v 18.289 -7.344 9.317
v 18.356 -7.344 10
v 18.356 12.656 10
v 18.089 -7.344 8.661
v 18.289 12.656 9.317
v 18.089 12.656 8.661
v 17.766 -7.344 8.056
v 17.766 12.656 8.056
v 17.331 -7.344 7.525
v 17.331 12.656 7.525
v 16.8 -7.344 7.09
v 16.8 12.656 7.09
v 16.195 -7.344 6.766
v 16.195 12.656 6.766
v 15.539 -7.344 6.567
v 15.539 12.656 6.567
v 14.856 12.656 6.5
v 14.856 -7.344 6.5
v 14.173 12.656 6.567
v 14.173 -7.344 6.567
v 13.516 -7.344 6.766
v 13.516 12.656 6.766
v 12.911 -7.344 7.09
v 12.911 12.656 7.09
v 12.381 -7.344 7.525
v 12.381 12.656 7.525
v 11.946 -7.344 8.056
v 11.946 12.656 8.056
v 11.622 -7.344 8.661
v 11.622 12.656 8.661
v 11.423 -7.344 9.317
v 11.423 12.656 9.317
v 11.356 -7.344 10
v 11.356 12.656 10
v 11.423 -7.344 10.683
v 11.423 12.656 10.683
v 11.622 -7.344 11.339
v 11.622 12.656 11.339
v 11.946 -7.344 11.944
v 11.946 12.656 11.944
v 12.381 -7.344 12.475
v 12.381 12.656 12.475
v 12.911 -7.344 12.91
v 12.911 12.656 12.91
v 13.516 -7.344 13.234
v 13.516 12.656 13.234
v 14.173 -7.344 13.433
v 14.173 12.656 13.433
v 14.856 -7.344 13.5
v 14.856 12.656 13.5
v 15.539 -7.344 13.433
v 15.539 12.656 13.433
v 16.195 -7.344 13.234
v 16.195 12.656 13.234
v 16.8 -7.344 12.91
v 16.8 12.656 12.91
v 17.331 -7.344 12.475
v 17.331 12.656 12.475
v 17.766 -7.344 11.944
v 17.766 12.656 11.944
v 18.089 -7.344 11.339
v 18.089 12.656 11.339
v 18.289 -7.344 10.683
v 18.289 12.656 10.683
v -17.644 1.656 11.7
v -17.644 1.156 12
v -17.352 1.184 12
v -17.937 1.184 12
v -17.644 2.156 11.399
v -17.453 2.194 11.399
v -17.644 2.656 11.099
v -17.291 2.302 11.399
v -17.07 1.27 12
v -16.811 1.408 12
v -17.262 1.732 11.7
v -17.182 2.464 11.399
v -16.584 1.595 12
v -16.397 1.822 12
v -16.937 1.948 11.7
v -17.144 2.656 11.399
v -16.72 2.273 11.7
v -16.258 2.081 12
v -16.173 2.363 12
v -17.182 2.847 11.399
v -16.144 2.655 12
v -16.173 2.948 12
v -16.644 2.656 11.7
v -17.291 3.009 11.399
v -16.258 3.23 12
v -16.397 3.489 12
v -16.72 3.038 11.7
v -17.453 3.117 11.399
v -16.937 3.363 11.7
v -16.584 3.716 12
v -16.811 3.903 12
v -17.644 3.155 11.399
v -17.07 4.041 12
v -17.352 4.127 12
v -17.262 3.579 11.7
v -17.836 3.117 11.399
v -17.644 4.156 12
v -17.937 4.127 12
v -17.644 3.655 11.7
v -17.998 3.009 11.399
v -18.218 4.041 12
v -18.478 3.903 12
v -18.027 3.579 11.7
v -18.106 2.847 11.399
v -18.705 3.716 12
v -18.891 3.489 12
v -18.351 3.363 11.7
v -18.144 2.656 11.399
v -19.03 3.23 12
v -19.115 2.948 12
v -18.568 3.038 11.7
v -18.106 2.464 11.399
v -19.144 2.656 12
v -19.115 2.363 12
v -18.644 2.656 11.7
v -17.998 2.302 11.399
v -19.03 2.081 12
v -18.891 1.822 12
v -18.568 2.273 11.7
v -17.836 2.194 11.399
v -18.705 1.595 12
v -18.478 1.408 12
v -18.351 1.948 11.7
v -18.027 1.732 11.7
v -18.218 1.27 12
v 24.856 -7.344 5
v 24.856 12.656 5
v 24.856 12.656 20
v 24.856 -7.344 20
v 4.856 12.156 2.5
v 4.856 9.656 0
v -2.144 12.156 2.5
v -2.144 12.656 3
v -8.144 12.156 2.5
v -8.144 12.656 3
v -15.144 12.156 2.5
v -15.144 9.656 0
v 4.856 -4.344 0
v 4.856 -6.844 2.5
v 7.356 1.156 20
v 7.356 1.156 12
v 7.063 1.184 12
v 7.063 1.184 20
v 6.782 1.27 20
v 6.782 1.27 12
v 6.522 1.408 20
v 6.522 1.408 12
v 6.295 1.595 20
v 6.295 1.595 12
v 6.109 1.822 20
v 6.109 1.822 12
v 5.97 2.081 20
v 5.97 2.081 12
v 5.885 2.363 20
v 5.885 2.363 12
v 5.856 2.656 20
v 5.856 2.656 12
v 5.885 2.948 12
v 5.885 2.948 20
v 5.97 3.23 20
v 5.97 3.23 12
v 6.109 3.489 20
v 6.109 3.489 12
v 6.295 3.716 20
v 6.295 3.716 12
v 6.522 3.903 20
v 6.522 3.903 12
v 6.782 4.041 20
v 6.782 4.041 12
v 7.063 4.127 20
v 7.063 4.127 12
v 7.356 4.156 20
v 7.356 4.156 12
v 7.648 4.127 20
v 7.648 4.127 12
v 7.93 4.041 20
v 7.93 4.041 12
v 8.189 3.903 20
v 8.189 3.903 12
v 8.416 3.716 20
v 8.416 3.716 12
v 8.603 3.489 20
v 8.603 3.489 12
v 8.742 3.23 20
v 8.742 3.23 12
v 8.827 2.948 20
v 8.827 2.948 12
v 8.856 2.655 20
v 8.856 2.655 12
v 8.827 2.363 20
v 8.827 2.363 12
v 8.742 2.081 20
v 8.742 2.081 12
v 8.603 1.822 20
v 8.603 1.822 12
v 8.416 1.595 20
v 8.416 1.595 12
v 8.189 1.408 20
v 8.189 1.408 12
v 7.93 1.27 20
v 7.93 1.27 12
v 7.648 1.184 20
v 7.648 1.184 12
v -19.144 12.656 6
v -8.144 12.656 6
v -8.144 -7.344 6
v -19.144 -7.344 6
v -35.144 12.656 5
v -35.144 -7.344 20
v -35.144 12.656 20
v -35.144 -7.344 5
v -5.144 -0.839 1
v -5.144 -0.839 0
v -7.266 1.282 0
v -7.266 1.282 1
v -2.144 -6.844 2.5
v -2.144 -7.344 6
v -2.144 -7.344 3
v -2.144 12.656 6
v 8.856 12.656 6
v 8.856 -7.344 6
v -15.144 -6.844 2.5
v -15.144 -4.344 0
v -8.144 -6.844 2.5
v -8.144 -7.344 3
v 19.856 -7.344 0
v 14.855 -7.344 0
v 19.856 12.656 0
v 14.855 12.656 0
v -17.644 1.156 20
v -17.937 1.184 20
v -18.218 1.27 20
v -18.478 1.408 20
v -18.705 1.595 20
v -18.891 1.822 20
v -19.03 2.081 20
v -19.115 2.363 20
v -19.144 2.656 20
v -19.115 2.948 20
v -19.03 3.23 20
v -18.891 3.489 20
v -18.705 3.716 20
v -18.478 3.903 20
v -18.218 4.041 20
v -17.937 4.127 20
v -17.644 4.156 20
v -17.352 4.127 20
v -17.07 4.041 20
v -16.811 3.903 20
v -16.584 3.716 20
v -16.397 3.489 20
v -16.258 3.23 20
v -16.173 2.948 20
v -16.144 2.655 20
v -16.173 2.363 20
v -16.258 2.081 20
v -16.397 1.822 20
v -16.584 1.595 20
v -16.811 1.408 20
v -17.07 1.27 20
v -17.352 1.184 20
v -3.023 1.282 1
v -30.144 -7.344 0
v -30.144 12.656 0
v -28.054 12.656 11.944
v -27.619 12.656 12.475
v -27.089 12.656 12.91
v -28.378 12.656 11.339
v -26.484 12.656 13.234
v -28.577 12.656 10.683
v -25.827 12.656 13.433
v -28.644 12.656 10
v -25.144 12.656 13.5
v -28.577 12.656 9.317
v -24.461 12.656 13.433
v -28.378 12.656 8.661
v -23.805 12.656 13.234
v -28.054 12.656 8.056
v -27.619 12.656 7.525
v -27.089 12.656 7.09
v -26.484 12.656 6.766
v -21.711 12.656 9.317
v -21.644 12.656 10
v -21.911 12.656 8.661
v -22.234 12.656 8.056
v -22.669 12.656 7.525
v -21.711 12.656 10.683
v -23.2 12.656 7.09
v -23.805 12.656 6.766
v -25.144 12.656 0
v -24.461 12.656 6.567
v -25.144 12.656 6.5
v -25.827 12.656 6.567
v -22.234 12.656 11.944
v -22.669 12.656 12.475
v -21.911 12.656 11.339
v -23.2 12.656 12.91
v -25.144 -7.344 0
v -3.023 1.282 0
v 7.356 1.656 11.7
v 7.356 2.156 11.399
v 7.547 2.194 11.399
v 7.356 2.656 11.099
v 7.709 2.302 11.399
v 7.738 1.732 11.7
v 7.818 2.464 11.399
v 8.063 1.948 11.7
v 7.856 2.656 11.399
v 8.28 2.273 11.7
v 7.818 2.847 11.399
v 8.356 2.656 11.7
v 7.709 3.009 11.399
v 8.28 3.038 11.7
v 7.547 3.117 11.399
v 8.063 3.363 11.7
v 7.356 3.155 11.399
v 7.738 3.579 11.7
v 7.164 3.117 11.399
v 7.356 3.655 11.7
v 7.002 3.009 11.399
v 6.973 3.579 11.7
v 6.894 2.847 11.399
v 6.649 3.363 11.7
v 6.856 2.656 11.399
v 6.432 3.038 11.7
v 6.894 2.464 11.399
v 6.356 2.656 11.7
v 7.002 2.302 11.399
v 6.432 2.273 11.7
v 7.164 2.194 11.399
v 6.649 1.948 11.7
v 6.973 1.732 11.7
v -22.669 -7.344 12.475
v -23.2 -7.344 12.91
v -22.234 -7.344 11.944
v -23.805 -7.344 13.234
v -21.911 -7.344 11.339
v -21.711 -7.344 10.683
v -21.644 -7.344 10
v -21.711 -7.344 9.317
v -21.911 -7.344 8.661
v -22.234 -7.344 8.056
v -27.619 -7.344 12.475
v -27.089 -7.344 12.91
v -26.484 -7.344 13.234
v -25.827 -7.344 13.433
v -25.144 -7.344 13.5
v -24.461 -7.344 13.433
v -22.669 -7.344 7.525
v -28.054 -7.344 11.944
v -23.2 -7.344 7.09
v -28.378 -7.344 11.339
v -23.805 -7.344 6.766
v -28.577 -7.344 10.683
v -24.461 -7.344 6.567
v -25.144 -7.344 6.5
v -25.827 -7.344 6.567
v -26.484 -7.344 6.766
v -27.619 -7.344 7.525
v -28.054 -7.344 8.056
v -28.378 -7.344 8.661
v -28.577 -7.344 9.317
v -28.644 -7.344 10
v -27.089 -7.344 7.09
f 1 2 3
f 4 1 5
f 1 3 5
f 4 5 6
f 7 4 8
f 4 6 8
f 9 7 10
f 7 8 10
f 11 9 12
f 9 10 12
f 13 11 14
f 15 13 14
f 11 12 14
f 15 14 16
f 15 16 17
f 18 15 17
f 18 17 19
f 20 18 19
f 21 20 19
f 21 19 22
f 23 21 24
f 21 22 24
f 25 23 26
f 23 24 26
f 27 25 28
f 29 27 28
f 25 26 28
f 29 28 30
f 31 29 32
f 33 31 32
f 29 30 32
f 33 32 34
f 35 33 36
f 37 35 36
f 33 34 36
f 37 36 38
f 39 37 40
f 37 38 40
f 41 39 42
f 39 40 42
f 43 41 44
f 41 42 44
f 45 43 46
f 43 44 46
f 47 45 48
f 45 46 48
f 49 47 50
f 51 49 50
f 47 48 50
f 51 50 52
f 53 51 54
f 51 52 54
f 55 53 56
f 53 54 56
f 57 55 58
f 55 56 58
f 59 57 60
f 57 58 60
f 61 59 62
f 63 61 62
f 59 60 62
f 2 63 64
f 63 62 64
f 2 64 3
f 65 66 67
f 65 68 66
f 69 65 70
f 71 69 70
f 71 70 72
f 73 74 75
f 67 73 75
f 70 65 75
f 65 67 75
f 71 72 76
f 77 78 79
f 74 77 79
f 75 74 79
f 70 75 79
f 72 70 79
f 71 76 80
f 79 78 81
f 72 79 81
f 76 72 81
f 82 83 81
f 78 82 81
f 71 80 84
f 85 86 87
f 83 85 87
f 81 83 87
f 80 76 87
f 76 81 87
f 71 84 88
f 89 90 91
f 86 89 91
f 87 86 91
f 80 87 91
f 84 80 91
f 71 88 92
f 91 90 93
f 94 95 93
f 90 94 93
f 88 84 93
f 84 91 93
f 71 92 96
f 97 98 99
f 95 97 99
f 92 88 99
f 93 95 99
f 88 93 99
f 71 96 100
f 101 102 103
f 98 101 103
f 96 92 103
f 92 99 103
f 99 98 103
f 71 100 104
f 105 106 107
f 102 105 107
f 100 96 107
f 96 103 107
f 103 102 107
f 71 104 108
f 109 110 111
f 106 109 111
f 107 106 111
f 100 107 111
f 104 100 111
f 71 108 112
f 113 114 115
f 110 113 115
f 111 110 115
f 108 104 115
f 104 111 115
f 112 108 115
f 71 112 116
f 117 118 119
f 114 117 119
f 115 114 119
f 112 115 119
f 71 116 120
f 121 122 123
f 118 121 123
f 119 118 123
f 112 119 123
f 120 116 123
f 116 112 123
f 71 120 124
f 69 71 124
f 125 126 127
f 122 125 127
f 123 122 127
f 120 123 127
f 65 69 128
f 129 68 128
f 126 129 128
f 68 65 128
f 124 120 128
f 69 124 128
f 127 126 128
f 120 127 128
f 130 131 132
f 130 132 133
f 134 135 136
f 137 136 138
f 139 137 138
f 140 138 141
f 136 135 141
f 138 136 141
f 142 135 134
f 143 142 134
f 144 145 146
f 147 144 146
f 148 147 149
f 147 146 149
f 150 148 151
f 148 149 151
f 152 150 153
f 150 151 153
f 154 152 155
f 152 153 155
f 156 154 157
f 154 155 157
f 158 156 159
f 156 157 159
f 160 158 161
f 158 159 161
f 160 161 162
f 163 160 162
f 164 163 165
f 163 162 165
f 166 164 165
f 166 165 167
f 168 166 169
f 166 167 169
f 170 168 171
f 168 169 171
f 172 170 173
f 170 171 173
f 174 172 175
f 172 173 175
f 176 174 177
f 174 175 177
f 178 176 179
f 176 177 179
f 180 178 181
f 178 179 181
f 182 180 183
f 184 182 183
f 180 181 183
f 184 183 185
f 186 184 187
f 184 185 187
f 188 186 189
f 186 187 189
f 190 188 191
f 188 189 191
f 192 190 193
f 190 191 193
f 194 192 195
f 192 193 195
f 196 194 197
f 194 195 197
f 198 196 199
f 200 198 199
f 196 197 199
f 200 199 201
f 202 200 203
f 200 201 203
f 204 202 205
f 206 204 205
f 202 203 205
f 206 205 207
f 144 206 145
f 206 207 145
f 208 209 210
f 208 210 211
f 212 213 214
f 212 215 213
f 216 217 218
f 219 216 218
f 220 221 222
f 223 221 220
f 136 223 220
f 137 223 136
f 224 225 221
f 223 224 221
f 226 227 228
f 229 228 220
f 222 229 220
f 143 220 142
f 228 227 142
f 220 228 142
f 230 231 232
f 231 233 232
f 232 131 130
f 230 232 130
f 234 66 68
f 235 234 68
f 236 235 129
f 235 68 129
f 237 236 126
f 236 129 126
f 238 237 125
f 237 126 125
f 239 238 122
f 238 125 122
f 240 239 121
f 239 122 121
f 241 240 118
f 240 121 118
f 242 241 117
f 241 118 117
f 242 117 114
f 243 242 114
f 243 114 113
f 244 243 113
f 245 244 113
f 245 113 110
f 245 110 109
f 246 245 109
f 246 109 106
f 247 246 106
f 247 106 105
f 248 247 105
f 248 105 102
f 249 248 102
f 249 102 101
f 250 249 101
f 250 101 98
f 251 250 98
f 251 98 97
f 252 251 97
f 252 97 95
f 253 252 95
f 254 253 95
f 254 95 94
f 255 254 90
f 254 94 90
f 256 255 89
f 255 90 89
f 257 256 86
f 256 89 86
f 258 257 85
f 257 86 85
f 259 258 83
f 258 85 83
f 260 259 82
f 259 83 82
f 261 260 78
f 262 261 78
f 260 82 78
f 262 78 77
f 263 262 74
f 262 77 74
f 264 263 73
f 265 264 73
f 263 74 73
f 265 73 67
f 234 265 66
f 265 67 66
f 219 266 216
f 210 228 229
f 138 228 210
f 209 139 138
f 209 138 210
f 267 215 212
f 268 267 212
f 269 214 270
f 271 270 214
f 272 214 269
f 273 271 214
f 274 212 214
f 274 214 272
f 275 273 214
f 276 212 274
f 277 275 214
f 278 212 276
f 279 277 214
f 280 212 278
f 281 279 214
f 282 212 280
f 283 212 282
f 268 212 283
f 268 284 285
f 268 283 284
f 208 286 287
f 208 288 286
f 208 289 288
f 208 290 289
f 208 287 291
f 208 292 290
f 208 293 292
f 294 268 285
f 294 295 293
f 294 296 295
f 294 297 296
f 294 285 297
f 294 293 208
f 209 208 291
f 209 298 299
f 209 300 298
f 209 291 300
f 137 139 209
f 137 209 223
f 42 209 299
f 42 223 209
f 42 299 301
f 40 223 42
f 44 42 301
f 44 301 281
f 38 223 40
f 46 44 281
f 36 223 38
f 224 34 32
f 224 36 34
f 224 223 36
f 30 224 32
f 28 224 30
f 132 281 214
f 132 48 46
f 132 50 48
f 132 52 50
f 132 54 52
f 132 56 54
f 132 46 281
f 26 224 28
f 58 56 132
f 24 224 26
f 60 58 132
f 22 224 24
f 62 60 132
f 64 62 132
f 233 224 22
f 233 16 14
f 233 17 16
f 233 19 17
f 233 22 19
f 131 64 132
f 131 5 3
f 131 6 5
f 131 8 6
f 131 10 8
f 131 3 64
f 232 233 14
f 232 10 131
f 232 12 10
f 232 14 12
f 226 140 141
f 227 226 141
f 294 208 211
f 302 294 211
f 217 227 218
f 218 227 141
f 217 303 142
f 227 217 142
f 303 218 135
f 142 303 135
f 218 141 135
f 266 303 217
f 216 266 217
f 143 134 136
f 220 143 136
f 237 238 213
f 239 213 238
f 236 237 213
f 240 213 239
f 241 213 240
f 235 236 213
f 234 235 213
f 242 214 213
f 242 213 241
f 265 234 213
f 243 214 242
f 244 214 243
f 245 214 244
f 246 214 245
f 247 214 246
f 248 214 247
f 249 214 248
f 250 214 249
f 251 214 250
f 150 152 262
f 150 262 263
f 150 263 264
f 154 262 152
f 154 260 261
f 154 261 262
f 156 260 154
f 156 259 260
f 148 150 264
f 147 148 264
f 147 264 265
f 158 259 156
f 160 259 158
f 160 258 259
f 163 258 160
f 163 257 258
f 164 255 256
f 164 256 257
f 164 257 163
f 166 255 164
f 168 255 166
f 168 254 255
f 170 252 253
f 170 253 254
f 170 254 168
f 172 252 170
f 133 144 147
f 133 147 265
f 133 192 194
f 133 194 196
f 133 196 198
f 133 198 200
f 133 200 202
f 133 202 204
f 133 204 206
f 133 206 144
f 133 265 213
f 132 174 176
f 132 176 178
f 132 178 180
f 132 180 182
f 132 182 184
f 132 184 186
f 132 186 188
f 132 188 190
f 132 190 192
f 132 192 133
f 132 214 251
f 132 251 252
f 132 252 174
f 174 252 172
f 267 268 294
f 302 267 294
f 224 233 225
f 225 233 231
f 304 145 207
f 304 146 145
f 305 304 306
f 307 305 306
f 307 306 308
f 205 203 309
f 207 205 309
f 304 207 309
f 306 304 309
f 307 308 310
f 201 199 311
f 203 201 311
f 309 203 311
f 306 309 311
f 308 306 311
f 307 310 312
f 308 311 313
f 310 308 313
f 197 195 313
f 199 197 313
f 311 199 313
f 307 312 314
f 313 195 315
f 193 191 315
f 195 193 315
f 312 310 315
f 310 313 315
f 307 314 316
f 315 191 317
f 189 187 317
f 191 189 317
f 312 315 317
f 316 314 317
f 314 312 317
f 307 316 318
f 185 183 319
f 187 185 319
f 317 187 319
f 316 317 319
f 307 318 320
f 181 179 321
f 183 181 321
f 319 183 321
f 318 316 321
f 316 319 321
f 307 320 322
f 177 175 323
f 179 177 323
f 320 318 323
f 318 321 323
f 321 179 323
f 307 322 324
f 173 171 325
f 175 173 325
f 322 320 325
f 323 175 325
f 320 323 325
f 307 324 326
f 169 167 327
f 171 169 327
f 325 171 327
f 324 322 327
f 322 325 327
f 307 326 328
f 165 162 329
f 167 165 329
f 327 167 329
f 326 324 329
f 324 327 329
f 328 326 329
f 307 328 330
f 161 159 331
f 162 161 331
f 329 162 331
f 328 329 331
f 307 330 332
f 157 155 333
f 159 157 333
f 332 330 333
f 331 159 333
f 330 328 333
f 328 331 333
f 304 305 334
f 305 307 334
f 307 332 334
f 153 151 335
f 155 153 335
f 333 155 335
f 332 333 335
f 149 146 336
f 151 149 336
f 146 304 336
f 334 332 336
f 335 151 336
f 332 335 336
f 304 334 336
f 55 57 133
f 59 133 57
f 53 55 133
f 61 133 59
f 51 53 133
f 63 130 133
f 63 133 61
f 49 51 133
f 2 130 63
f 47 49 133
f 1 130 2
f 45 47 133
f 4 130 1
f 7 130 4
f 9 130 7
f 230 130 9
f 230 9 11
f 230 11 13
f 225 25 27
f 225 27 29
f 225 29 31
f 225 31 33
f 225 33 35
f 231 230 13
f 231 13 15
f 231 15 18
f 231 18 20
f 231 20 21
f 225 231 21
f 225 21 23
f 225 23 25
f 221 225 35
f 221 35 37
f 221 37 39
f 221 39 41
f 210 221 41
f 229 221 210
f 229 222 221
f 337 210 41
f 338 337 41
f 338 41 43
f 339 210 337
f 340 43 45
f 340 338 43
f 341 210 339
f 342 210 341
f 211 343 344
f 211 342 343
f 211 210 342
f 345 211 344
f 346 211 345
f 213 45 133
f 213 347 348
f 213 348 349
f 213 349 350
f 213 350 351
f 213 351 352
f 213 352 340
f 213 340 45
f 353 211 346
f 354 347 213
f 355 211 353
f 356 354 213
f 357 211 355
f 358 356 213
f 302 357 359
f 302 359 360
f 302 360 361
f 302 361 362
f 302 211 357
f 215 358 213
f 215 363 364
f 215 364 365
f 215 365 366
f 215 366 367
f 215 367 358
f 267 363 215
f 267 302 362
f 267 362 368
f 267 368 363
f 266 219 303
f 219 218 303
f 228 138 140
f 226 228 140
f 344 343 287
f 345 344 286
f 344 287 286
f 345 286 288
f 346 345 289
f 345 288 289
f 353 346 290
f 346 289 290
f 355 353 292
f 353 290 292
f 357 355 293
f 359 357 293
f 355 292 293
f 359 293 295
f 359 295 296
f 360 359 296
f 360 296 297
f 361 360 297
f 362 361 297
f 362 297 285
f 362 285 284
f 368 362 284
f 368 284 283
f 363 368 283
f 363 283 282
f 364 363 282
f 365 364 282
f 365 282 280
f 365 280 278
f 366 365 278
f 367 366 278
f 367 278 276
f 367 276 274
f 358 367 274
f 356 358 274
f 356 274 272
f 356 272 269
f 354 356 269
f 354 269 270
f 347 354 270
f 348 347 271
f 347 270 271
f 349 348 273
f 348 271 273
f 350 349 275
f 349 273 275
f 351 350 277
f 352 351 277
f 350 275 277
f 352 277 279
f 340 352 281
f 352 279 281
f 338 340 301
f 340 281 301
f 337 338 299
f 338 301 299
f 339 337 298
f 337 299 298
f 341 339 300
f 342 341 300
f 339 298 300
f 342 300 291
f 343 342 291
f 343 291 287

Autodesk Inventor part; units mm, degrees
ref_plane "YZ Plane" through (0, 0, 0) normal (1, 0, 0) x (0, 1, 0)
ref_plane "XZ Plane" through (0, 0, 0) normal (0, 1, 0) x (-1, 0, 0)
ref_plane "XY Plane" through (0, 0, 0) normal (0, 0, 1) x (1, 0, 0)
sketch "Sketch1" plane through (0, 0, 0) normal (0, 0, 1) x (1, 0, 0)
  line L0 (-35.1442, 12.6555) -> (24.8558, 12.6555)
  line L1 (24.8558, 12.6555) -> (24.8558, -7.3445)
  line L2 (24.8558, -7.3445) -> (-35.1442, -7.3445)
  line L3 (-35.1442, -7.3445) -> (-35.1442, 12.6555)
  point P0 (0, 0)
  dimension "d0" = 60
  dimension "d1" = 20
extrude "Extrusion1" add sketch "Sketch1" along normal blind 20
sketch "Sketch2" plane through (-35.1442, 12.6555, 0) normal (0, 1, 0) x (1, 0, 0)
  line L0 (0, 0) -> (0, -20) projected
  line L1 (60, 0) -> (60, -20) projected
  line L2 (0, 0) -> (60, 0) projected
  circle A0 centre (10, -10) radius 3.5
  circle A1 centre (50, -10) radius 3.5
  point P0 (35.1442, 0)
  dimension "d4" = 40
  dimension "d5" = 10
  dimension "d6" = 10
  dimension "d7" = 10
  dimension "d8" = 7
  dimension "d9" = 7
extrude "Extrusion2" cut sketch "Sketch2" against normal blind 20
sketch "Sketch3" plane through (0, 0, 20) normal (0, 0, 1) x (1, 0, 0)
  line L0 (-35.1442, 12.6555) -> (24.8558, 12.6555) projected
  line L1 (-35.1442, 12.6555) -> (-35.1442, -7.3445) projected
  line L2 (24.8558, -7.3445) -> (24.8558, 12.6555) projected
  point P0 (0, 0)
  point P1 (-17.6442, 2.6555)
  point P2 (7.3558, 2.6555)
  dimension "d12" = 10
  dimension "d13" = 10
  dimension "d14" = 25
  dimension "d15" = 17.5
  dimension "d16" = 17.5
hole "Hole1" at (-17.6442, 2.6555, 20) at (7.3558, 2.6555, 20) direction (0, 0, -1) diameter 3 depth 8 tip angle 118
sketch "Sketch4" plane through (-35.1442, 12.6555, 0) normal (0, 1, 0) x (1, 0, 0)
  line L0 (60, 0) -> (0, 0) projected
  line L1 (16, 0) -> (44, 0)
  line L2 (44, 0) -> (44, -6)
  line L3 (44, -6) -> (16, -6)
  line L4 (16, -6) -> (16, 0)
  line L5 (0, 0) -> (0, -20) projected
  line L6 (60, 0) -> (60, -20) projected
  point P0 (35.1442, 0)
  dimension "d24" = 16
  dimension "d25" = 16
  dimension "d26" = 6
extrude "Extrusion3" cut sketch "Sketch4" against normal blind 20
chamfer "Chamfer1" distance 6 angle 45 2 edges at (8.8558, 2.6555, 0) (-19.1442, 2.6555, 0)
sketch "Sketch5" plane through (-35.1442, 12.6555, 20) normal (0, 1, 0) x (1, 0, 0)
  point P0 (35.1442, 20)
sketch "Sketch6" plane through (8.8558, 12.6555, 6) normal (0, 0, -1) x (-1, 0, 0)
  point P0 (8.8558, -12.6555)
sketch "Sketch7" plane through (-35.1442, 12.6555, 20) normal (0, 1, 0) x (1, 0, 0)
  line L0 (20, 20) -> (40, 20)
  line L1 (40, 20) -> (40, 17.5)
  line L2 (40, 17.5) -> (20, 17.5)
  line L3 (20, 17.5) -> (20, 20)
  line L4 (0, 20) -> (0, 0) projected
  line L5 (60, 20) -> (60, 0) projected
  line L6 (50, 20) -> (60, 20) projected
  line L7 (44, 14) -> (16, 14) projected
  line L8 (27, 14) -> (33, 14)
  line L9 (33, 14) -> (33, 17.5)
  line L10 (33, 17.5) -> (27, 17.5)
  line L11 (27, 17.5) -> (27, 14)
  point P0 (35.1442, 20)
  dimension "d32" = 20
  dimension "d33" = 20
  dimension "d34" = 2.5
  dimension "d35" = 7
  dimension "d36" = 7
extrude "Extrusion4" add sketch "Sketch7" against normal blind 20
chamfer "Chamfer2" distance 3 angle 45 2 edges at (-5.1442, 12.6555, 0) (-5.1442, -7.3445, 0)
chamfer "Chamfer3" distance 5 angle 45 2 edges at (24.8558, 2.6555, 0) (-35.1442, 2.6555, 0)
sketch "Sketch8" plane through (4.8558, -4.3445, 0) normal (0, 0, -1) x (-1, 0, 0)
  line L0 (10, 3.5052) -> (12.1213, 5.6266)
  line L1 (10, 3.5052) -> (13, 3.5052) construction
  line L2 (12.1213, 5.6266) -> (7.8787, 5.6266)
  line L3 (7.8787, 5.6266) -> (10, 3.5052)
  point P0 (4.8558, 4.3445)
  dimension "d45" = 3
  dimension "d46" = 45
extrude "Extrusion5" cut sketch "Sketch8" against normal blind 1
properties part number "Moving block"
